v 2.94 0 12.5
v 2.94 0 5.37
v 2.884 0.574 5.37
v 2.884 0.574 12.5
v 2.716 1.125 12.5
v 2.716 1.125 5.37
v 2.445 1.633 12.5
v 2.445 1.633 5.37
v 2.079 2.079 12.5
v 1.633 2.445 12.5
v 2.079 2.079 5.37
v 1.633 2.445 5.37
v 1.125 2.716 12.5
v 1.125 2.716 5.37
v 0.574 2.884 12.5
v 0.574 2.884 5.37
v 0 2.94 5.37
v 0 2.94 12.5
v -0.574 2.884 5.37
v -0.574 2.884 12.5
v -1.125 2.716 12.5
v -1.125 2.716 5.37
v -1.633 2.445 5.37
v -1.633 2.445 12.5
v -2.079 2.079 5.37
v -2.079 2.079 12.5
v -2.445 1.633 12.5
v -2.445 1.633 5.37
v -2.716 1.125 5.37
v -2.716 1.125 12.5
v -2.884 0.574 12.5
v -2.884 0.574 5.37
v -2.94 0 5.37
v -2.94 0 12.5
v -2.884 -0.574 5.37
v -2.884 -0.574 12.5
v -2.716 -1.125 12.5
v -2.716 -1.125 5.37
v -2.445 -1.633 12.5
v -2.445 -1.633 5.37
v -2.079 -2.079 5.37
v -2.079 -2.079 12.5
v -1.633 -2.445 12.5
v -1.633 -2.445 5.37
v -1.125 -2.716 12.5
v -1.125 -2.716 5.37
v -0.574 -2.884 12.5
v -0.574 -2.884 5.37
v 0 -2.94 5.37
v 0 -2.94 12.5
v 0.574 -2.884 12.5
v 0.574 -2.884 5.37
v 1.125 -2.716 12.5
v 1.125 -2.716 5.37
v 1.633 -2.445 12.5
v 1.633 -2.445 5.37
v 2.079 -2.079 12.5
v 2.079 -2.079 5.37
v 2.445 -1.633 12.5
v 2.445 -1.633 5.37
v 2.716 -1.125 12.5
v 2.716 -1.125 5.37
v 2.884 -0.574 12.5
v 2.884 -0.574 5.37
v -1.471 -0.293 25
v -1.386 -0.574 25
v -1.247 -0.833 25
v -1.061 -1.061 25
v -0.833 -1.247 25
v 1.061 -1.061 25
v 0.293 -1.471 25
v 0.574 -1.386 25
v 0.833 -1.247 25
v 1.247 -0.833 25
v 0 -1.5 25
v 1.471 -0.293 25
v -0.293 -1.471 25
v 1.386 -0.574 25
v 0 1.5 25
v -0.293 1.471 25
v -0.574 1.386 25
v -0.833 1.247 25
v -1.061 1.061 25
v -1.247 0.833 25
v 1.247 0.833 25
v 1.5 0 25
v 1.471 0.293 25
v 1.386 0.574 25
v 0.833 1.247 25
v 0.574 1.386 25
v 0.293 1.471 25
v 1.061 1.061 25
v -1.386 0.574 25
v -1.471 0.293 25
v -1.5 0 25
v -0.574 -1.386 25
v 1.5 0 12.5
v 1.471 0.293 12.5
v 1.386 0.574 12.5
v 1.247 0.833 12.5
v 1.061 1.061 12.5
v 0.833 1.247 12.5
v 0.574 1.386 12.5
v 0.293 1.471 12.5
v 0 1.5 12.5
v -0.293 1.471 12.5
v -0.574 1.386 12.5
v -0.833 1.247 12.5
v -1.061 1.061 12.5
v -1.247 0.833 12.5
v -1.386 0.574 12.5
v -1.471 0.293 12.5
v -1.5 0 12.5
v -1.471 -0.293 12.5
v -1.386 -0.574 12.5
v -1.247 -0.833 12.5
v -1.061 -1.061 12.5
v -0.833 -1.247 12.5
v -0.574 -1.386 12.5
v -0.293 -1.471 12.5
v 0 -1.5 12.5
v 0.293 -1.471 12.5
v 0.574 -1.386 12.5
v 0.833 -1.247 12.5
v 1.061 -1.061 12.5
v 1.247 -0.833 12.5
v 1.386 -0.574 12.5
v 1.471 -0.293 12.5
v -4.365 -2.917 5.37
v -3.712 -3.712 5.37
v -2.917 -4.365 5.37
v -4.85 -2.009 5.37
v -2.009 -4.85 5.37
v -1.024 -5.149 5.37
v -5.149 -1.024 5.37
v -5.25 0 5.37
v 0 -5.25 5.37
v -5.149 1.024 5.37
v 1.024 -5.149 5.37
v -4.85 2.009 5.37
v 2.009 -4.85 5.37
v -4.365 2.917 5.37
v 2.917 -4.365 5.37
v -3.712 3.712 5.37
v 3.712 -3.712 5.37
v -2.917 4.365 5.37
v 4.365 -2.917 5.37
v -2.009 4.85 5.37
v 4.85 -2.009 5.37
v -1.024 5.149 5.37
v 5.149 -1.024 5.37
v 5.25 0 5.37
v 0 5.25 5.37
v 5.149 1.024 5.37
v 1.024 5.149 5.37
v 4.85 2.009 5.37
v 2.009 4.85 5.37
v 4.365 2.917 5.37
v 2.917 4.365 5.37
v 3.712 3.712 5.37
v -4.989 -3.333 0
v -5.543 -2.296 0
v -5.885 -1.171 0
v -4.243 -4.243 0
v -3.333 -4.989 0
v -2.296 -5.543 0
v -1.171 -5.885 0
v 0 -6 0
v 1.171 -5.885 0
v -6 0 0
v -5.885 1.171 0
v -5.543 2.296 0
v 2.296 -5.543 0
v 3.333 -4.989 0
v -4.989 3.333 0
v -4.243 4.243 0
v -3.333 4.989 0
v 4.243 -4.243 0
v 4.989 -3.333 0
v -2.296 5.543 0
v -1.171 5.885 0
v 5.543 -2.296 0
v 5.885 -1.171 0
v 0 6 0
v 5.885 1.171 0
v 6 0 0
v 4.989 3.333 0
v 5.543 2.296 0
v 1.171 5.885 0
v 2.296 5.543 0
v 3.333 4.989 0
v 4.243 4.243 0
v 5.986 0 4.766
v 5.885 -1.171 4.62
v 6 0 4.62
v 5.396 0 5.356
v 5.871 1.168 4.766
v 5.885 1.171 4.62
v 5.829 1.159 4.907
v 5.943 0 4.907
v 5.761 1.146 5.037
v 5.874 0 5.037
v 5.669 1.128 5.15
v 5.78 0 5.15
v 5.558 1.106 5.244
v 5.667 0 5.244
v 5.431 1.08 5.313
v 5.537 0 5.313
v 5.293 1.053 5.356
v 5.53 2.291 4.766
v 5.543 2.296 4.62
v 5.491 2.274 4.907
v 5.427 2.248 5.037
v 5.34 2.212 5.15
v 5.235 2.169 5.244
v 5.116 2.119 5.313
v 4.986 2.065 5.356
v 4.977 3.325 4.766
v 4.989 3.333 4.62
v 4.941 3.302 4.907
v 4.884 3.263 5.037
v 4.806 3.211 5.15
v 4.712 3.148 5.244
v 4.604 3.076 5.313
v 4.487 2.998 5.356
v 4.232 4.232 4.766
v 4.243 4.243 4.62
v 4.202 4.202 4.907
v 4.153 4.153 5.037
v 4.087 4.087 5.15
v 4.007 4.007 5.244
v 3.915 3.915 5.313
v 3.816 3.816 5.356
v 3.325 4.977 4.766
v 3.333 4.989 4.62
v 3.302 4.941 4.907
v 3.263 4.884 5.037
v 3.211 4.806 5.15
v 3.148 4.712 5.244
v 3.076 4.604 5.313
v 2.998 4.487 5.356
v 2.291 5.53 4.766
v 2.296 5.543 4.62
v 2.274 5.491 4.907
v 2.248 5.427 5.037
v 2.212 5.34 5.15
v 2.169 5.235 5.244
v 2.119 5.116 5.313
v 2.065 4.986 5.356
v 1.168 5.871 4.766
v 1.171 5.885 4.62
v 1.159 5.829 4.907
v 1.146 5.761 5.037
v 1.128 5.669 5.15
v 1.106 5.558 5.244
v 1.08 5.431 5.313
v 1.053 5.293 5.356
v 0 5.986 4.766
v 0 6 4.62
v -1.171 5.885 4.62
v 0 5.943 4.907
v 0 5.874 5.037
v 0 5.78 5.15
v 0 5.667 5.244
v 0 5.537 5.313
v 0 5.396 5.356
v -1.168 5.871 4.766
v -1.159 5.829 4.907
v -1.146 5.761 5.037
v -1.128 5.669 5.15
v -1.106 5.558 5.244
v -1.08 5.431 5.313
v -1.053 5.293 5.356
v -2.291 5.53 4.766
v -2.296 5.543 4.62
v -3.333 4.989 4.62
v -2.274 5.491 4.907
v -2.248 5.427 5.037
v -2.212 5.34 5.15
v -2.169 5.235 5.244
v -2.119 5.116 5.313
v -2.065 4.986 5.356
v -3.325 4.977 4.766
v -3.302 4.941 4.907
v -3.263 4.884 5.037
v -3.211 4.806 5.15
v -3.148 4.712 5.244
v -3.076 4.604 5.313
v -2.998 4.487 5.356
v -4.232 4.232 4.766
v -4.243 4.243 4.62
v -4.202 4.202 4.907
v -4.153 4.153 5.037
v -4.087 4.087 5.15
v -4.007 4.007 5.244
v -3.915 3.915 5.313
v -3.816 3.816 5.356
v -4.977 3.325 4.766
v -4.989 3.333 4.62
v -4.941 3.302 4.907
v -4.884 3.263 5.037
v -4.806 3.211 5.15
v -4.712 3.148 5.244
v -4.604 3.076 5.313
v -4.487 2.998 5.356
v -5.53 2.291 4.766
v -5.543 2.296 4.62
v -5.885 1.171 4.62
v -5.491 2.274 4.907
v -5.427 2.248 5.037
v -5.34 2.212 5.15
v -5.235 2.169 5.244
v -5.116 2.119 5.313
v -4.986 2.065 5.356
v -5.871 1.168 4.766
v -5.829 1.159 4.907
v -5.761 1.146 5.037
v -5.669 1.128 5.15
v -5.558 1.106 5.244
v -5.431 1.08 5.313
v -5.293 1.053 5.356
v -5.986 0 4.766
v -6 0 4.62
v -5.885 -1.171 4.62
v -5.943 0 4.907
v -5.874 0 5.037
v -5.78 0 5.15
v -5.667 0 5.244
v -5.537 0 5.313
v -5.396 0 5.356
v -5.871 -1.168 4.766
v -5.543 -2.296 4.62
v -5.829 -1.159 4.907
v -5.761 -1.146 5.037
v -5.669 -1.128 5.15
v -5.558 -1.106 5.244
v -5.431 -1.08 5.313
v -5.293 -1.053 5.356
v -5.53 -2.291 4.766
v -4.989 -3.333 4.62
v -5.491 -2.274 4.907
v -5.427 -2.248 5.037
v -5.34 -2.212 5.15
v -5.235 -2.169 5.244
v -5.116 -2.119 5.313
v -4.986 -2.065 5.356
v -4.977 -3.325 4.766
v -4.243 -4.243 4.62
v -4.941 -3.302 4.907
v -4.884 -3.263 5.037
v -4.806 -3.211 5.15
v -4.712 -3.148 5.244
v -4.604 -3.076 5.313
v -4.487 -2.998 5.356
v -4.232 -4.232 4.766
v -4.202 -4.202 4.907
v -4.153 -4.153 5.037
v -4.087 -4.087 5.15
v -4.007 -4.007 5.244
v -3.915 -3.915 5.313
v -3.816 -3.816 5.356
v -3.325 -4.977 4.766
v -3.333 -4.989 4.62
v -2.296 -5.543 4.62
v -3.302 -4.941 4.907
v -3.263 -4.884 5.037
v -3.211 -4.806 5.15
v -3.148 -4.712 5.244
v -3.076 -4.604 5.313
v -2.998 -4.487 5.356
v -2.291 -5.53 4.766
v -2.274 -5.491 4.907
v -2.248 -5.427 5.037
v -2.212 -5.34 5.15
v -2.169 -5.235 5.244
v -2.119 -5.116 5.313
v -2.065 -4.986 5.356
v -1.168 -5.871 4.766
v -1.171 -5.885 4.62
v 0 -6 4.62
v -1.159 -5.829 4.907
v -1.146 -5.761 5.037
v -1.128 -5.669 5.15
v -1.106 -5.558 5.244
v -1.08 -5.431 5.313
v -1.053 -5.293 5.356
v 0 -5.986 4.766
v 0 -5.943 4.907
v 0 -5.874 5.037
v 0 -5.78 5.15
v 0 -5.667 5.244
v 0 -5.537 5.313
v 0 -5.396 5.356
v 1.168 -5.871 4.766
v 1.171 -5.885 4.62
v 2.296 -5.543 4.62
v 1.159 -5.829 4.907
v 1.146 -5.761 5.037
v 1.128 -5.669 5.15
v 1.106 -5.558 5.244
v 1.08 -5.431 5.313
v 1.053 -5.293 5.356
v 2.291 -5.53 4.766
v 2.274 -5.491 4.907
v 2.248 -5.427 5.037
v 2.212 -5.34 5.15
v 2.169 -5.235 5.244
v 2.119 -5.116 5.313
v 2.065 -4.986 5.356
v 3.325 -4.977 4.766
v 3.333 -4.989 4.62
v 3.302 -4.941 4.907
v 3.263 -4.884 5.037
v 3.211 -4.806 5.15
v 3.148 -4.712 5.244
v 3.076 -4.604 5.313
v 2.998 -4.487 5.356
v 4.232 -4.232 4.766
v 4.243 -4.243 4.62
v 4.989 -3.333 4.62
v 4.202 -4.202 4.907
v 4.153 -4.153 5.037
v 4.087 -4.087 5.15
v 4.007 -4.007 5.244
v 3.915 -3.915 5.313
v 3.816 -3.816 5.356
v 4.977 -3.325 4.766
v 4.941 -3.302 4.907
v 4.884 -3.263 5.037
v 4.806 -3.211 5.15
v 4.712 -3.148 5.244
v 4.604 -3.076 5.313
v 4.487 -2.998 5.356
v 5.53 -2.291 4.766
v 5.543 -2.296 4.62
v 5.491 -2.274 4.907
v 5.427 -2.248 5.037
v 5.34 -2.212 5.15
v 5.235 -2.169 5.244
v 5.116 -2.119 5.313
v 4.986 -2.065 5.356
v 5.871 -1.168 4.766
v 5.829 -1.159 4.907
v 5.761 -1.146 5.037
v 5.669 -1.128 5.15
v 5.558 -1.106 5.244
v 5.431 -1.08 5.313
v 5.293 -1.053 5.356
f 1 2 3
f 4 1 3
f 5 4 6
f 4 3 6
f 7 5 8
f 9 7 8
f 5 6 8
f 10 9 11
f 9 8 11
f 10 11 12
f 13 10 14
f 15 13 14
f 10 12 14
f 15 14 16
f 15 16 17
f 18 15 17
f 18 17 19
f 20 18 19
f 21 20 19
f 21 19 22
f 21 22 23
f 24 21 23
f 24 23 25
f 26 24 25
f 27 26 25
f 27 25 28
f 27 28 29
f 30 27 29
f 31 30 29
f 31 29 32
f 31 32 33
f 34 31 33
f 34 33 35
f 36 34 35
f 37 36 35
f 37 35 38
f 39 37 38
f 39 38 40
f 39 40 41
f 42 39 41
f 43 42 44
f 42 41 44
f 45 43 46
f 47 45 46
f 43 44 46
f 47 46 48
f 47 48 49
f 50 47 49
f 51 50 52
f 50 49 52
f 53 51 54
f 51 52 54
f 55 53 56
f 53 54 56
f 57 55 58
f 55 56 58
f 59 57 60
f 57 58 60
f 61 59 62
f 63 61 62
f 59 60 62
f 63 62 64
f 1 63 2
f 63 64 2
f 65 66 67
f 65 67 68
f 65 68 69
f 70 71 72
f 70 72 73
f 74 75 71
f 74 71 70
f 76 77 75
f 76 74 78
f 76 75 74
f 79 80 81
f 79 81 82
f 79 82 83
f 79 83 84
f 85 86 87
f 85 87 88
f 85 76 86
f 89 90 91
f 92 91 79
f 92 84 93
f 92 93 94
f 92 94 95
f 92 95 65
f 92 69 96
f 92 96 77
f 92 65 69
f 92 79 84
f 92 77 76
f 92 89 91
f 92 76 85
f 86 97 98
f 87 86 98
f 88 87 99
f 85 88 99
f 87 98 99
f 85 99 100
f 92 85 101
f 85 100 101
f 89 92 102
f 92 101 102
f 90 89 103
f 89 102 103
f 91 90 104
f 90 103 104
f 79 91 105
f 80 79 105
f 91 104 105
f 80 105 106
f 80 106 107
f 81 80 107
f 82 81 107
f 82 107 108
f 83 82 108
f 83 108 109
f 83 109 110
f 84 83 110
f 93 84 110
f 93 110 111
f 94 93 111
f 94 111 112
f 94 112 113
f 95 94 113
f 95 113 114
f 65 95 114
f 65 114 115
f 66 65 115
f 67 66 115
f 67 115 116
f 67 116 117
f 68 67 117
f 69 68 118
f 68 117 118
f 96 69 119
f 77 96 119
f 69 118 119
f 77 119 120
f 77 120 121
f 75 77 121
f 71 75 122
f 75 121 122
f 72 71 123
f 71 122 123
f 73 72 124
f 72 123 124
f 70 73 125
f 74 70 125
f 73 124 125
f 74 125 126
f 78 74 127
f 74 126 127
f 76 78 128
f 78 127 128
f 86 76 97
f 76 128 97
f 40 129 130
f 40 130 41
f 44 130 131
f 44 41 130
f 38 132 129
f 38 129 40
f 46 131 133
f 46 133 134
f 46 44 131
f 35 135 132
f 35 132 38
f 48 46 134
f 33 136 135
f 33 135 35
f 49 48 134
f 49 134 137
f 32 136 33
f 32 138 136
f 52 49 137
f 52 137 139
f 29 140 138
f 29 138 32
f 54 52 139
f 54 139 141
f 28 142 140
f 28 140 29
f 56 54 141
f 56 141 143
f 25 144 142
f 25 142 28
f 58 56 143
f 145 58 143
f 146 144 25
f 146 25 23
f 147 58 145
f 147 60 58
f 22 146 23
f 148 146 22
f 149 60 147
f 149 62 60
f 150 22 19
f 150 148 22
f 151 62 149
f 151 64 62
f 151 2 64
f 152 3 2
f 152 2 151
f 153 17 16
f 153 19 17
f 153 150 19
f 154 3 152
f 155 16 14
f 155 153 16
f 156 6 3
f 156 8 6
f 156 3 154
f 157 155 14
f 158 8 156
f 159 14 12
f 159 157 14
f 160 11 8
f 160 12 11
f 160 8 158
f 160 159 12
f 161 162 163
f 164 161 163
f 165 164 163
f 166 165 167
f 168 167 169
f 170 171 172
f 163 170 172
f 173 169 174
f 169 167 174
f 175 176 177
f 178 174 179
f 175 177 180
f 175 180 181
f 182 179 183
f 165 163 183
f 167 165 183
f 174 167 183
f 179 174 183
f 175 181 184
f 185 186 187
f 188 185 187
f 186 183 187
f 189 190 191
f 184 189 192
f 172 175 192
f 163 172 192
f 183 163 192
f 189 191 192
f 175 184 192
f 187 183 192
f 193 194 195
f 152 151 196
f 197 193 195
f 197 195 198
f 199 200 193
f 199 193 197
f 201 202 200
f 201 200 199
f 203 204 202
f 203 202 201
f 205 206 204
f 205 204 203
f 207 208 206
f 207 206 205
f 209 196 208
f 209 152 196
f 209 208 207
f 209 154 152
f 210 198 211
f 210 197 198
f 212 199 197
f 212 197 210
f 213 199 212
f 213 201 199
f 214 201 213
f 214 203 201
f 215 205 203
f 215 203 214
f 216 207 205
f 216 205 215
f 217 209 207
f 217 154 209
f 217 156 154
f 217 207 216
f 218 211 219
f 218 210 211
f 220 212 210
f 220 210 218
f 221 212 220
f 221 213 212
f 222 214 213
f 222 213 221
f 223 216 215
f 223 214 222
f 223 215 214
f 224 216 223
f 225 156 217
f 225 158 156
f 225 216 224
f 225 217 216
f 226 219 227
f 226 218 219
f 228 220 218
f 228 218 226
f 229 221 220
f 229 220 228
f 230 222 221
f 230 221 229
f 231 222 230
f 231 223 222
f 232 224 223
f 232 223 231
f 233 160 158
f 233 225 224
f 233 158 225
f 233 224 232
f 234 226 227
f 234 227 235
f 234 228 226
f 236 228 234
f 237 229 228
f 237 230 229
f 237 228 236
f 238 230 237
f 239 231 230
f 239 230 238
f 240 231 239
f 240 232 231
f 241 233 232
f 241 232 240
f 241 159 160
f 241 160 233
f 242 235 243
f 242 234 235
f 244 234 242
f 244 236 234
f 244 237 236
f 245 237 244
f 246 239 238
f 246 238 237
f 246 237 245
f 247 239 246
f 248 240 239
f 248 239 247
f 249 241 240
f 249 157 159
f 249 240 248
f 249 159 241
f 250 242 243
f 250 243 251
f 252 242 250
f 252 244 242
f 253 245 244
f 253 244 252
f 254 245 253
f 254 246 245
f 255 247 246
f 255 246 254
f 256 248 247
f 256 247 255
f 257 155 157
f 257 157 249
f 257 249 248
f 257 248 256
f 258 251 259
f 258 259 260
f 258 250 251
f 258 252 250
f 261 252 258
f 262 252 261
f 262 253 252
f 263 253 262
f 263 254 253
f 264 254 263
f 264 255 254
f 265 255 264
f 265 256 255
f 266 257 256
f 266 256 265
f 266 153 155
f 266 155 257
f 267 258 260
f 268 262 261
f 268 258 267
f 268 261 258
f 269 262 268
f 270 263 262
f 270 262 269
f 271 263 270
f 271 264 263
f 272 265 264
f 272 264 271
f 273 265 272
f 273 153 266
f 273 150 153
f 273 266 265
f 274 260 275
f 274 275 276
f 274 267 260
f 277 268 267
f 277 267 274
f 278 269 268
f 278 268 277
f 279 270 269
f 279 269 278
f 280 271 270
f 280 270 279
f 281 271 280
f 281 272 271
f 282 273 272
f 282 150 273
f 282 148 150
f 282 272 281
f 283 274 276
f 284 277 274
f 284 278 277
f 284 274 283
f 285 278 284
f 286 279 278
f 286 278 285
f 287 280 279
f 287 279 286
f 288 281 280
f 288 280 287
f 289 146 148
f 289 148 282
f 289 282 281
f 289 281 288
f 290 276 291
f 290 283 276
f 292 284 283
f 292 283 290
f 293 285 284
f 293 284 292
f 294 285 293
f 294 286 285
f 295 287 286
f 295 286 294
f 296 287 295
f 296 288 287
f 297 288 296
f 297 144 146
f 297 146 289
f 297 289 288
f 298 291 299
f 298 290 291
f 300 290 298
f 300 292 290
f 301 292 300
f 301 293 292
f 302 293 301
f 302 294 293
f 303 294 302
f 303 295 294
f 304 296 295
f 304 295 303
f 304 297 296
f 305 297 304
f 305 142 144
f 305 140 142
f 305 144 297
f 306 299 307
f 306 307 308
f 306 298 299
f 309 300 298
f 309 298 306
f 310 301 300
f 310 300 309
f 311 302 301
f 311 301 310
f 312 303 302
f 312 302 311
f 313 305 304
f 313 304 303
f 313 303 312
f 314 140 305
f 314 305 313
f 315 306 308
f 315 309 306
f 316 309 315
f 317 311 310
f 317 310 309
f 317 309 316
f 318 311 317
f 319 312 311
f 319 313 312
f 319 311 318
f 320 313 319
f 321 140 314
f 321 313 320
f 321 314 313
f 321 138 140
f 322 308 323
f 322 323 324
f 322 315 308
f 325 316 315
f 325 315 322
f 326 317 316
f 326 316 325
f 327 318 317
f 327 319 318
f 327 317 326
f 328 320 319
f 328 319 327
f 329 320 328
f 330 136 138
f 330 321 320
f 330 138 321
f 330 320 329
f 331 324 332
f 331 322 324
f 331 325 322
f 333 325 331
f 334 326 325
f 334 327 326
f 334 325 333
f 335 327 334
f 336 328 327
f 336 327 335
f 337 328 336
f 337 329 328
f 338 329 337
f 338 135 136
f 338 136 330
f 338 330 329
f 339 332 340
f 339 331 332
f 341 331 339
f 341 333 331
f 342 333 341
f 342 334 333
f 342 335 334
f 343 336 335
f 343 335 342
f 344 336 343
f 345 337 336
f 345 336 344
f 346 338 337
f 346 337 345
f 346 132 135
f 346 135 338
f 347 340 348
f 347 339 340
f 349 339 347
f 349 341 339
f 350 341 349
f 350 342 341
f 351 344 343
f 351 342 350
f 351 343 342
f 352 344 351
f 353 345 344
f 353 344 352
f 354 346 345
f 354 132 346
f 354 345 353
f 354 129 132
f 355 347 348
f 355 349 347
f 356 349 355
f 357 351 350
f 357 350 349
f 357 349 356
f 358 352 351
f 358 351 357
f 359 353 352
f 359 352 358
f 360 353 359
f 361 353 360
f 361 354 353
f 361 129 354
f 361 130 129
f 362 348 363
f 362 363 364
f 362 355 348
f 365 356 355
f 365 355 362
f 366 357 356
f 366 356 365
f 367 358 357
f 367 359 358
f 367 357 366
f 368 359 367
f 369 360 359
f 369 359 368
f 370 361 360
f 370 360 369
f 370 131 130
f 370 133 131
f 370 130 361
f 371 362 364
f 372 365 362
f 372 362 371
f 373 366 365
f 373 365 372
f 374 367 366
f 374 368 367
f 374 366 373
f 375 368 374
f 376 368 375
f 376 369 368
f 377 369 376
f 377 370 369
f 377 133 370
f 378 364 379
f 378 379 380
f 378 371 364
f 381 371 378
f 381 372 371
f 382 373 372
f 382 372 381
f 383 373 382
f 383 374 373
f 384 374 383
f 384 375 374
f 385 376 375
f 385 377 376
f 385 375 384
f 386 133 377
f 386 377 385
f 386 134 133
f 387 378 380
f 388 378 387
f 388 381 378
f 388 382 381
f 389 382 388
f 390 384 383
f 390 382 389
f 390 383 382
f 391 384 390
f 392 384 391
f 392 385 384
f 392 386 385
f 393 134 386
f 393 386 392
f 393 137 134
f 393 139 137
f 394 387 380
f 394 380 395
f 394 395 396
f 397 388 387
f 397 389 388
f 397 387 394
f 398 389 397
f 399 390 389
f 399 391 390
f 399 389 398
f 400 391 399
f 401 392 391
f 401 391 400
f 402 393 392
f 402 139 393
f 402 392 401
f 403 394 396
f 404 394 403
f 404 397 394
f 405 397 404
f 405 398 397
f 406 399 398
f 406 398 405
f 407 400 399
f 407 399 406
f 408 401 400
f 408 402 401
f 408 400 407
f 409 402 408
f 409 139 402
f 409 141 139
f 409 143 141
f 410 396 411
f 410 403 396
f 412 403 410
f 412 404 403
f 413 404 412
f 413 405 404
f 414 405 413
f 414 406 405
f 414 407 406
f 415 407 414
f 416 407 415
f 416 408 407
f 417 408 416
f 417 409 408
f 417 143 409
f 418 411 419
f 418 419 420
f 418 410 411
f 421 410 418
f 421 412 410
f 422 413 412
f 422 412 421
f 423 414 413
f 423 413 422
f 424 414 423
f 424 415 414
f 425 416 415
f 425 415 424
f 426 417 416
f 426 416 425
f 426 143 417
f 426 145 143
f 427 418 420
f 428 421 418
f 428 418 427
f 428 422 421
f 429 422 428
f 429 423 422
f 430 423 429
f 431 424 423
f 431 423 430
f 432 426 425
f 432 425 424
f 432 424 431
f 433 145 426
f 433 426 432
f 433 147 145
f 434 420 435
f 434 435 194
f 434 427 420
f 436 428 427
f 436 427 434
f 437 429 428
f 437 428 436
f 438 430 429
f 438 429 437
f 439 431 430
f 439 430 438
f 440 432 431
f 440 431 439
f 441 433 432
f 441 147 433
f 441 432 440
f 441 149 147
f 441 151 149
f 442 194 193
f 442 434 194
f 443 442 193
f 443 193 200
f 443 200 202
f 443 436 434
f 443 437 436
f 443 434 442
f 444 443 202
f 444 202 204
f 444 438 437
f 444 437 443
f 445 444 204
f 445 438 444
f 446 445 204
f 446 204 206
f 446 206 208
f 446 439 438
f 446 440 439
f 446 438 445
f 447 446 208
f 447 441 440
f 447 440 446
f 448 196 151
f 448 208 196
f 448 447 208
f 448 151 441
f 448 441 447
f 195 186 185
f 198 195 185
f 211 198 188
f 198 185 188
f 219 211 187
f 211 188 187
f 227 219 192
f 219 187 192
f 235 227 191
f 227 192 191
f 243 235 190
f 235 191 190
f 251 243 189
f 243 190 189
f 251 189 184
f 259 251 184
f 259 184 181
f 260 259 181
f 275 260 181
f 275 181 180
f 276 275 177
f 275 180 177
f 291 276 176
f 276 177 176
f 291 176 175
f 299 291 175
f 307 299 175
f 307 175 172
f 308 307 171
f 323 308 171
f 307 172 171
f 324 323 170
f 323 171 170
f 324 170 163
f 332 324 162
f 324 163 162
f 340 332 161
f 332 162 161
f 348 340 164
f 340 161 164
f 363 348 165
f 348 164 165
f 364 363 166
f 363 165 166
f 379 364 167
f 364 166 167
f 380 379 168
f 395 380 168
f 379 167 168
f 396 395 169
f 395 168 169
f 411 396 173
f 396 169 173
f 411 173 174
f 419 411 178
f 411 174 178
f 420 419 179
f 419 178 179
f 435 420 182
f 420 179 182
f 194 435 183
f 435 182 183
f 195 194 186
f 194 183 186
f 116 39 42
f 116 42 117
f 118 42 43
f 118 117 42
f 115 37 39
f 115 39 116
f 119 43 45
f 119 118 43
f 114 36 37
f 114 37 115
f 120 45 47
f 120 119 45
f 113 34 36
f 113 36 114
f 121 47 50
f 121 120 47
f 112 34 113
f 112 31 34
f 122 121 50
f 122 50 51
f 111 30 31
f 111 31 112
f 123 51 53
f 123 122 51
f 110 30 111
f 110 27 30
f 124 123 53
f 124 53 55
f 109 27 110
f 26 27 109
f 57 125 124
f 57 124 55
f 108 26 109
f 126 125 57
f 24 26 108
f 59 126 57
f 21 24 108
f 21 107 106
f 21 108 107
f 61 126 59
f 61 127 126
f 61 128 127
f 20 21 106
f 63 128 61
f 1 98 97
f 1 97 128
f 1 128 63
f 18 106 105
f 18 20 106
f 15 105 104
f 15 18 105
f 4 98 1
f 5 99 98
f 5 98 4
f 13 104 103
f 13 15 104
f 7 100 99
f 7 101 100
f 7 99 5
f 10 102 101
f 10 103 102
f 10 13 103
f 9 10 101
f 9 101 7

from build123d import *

# Parameters (mm, degrees)
F0_R     = 1.5
F1_DEPTH = 25
F0_R_2   = 2.94
F2_DEPTH = 12.5
F0_R_3   = 6
F3_DEPTH = 5.37
F4_R     = 0.75


with BuildPart() as f1:
    # F0 (on Top) → F1 (new body)
    with BuildSketch(Plane.XY):
        Circle(F0_R)
    extrude(amount=F1_DEPTH)

    # F0 (on Top) → F2 (join)
    with BuildSketch(Plane.XY):
        Circle(F0_R_2)
        Circle(F0_R, mode=Mode.SUBTRACT)
    extrude(amount=F2_DEPTH)

    # F0 (on Top) → F3 (join)
    with BuildSketch(Plane.XY):
        Circle(F0_R_3)
        Circle(F0_R_2, mode=Mode.SUBTRACT)
    extrude(amount=F3_DEPTH)

    # F4
    f4_edges = [f1.edges().sort_by_distance(p)[0] for p in [
        (-6, 0, 5.37),
    ]]
    fillet(f4_edges, radius=F4_R)


solid = f1.part
